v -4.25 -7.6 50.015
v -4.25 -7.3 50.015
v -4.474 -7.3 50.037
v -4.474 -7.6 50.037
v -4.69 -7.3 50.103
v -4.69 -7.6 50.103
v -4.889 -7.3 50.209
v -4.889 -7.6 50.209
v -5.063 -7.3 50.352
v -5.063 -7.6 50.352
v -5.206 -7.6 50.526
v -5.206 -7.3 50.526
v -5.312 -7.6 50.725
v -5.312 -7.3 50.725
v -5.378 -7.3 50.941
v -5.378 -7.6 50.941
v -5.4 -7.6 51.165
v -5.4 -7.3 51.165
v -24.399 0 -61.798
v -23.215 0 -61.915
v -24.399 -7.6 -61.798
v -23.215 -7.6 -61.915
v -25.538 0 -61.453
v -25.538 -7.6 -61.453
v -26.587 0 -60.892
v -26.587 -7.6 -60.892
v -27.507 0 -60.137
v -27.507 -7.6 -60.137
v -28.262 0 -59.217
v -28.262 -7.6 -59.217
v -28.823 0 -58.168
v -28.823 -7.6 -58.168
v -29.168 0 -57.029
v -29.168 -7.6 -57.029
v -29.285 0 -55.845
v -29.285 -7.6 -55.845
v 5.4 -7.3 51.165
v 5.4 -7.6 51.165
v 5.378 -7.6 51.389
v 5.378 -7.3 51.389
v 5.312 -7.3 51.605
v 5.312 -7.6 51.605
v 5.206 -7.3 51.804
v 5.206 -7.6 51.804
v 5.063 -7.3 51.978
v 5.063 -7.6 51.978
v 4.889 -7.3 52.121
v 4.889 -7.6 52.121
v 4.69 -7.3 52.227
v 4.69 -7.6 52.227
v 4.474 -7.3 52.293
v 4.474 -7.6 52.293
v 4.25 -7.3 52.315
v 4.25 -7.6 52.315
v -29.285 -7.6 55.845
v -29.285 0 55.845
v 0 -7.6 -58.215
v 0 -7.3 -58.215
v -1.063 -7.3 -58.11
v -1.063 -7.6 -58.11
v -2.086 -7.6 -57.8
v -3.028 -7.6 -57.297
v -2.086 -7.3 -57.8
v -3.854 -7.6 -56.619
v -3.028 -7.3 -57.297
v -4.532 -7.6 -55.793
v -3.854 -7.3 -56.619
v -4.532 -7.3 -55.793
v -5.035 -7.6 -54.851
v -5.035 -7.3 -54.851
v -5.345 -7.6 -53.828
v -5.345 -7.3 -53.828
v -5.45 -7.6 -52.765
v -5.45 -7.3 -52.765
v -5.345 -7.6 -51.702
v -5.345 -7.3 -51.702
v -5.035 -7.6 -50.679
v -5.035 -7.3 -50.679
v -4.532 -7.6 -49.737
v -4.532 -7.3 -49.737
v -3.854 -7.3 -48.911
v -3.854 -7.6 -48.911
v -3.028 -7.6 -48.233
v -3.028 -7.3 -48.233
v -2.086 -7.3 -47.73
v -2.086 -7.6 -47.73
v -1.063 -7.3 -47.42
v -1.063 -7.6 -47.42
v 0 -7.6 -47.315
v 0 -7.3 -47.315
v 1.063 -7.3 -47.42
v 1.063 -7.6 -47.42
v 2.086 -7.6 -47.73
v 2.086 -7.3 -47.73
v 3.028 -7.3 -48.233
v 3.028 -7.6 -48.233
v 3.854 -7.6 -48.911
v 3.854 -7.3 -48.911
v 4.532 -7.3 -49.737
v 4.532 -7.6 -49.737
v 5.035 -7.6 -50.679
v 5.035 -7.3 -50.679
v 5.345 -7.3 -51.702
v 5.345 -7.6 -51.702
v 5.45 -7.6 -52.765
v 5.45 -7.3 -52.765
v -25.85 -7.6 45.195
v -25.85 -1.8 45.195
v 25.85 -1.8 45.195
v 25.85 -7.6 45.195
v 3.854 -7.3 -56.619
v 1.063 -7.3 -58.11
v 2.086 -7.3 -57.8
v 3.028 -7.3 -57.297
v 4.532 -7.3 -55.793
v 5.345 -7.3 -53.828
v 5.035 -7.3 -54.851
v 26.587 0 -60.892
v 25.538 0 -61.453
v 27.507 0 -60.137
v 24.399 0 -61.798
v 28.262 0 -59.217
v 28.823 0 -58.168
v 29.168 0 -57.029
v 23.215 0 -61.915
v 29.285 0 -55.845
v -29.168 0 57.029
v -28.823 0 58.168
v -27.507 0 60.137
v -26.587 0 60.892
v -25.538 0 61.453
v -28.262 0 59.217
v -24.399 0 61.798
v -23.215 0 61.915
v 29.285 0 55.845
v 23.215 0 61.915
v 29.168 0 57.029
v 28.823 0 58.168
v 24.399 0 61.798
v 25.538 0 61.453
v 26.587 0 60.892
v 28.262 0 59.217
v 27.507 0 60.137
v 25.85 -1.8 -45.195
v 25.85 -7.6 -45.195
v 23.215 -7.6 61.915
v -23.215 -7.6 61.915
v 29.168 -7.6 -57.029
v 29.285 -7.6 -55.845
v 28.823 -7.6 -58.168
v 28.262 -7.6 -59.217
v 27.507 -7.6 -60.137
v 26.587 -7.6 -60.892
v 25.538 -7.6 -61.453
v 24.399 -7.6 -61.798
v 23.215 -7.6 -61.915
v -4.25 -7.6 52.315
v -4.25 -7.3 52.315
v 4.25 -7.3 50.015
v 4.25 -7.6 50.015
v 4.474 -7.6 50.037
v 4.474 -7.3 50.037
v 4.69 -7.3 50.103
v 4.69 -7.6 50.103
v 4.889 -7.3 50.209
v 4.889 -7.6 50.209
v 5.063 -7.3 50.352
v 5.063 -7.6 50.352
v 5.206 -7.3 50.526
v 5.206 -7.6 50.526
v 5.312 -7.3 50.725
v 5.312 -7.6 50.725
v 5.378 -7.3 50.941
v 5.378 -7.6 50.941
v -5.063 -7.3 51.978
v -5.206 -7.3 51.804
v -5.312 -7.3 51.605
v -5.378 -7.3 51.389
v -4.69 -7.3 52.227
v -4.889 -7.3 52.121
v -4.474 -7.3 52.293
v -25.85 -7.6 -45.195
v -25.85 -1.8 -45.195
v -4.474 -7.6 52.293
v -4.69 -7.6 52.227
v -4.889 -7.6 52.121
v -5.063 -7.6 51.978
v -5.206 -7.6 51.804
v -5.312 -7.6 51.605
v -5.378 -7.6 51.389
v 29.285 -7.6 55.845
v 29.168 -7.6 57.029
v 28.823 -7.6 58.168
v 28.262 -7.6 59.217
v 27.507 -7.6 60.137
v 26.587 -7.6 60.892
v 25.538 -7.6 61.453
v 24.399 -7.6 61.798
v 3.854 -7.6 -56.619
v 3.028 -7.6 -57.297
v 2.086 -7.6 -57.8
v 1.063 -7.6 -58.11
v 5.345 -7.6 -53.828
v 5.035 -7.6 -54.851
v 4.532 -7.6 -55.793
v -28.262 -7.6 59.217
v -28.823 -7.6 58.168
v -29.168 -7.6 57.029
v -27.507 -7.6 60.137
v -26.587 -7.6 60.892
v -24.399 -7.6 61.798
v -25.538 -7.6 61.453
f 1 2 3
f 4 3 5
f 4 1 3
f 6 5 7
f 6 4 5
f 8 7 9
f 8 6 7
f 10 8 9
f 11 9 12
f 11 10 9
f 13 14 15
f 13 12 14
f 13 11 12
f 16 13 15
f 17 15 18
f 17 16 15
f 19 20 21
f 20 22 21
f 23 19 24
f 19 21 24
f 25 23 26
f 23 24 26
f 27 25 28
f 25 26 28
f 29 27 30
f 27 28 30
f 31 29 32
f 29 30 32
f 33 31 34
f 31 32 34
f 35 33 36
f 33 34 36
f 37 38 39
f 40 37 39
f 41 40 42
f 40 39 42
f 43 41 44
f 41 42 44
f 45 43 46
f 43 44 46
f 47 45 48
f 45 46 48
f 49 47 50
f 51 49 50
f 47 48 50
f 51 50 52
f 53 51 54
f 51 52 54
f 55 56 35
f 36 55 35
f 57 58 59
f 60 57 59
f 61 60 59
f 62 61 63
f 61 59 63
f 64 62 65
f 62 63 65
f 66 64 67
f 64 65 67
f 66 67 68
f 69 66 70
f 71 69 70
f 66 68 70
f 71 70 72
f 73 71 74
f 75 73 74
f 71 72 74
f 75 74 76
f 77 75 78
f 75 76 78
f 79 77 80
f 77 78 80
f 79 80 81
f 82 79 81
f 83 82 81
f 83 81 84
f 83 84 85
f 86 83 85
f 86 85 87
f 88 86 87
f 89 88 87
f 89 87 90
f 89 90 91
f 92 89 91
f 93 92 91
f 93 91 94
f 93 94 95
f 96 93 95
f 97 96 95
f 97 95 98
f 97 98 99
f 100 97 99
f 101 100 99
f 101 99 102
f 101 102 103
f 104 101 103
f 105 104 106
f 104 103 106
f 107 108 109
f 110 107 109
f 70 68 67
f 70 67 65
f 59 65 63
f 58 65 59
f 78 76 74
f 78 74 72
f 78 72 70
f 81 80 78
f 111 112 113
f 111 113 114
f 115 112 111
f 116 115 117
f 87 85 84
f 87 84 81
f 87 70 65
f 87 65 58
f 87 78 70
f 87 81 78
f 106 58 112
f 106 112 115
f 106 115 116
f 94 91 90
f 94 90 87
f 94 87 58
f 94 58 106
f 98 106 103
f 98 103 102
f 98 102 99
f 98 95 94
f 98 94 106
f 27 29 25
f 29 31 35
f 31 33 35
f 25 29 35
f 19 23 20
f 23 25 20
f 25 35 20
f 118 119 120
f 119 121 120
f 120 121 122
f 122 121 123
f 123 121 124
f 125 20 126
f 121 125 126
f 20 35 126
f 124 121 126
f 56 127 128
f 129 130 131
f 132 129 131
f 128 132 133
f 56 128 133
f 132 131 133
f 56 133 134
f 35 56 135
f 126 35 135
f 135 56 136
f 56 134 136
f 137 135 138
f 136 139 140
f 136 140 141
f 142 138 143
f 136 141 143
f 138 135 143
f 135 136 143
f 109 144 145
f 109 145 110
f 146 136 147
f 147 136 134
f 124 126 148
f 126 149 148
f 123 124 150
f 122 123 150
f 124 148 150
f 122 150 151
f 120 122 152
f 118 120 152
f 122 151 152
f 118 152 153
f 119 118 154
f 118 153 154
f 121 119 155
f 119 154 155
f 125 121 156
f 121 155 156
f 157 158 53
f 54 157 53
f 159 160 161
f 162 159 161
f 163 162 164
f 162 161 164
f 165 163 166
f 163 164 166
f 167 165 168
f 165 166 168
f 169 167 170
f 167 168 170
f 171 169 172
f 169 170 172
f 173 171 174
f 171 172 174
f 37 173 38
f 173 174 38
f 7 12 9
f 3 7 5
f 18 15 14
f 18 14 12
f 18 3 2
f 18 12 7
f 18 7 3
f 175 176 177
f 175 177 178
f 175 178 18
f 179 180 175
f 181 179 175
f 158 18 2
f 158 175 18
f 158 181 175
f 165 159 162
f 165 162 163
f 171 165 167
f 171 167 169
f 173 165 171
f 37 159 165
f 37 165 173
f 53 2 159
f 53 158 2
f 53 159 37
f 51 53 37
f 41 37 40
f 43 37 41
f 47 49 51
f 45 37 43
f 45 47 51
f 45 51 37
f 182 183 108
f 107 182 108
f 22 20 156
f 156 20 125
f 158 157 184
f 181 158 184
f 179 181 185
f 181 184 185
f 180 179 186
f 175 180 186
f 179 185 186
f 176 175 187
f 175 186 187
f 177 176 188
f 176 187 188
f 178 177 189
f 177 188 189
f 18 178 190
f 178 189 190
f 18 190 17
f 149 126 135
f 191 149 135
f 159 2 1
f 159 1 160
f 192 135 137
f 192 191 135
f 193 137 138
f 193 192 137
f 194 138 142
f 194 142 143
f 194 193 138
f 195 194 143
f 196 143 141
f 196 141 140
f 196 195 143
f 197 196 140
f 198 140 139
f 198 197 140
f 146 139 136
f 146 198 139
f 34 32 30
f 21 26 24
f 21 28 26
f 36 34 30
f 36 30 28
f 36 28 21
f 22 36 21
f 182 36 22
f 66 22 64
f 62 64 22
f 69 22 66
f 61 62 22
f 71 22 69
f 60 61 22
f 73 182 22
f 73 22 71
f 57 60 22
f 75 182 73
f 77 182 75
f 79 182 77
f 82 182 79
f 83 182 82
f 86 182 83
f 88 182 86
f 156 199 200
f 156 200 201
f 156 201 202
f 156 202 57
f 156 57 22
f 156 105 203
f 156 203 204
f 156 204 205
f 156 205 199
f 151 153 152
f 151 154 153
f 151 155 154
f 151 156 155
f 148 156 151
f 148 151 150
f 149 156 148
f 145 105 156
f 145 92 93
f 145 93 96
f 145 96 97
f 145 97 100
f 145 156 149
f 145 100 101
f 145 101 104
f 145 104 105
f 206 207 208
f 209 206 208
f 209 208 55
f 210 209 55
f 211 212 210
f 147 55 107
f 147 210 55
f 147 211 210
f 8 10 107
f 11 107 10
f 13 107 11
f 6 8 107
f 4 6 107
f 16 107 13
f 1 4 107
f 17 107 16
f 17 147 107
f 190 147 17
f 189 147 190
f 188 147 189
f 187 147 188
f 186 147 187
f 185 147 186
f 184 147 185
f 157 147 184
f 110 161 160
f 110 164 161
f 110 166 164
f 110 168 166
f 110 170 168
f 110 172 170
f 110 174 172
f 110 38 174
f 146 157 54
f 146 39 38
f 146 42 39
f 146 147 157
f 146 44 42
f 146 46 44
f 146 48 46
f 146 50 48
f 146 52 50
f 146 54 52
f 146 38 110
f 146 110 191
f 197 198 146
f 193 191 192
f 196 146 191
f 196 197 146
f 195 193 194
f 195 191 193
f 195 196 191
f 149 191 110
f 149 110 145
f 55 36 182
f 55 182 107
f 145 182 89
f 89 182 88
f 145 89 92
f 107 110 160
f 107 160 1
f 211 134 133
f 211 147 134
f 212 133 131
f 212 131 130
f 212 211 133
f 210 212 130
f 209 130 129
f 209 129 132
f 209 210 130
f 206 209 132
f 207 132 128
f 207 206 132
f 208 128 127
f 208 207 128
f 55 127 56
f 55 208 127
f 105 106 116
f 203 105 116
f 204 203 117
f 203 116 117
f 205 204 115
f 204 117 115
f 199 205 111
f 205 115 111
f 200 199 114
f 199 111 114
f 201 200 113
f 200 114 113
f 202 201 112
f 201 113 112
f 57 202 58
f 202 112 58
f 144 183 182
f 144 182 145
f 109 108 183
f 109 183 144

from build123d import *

# Parameters (mm, degrees)
F0_W     = 51.7
F0_H     = 90.39
F0_W_2   = 10.8
F0_H_2   = 2.3
F1_DEPTH = 7.6
F2_R     = 6.07
F3_DEPTH = 1.8
F4_R     = 1.14999
F5_DEPTH = 7.3
F6_DEPTH = 7.3


# Not quite as in the source:
# - a fillet or chamfer is up to 0.001 mm smaller than in the source, because OpenCascade refuses the exact size


with BuildPart() as f1:
    # F0 (on Front) → F1 (new body)
    with BuildSketch(Plane.XZ):
        Polygon((0, -61.915), (29.285, -61.915), (29.285, 61.915), (-29.285, 61.915), (-29.285, -61.915), align=None)
        with BuildLine():
            ThreePointArc((5.45, -52.765), (3.8537319575, -56.6187319575), (0, -58.215))
            ThreePointArc((0, -58.215), (-3.8537319575, -48.9112680425), (5.45, -52.765))
        make_face(mode=Mode.SUBTRACT)
        Rectangle(F0_W, F0_H, mode=Mode.SUBTRACT)
        with Locations((0, 51.165)):
            Rectangle(F0_W_2, F0_H_2, mode=Mode.SUBTRACT)
    extrude(amount=F1_DEPTH)

    # F2
    f2_edges = [f1.edges().sort_by_distance(p)[0] for p in [
        (-29.285, -3.8, 61.915),
        (29.285, -3.8, 61.915),
        (-29.285, -3.8, -61.915),
        (29.285, -3.8, -61.915),
    ]]
    fillet(f2_edges, radius=F2_R)

    # F0 (on Front) → F3 (join)
    with BuildSketch(Plane.XZ):
        Rectangle(F0_W, F0_H)
    extrude(amount=F3_DEPTH)

    # F4 (radius 1.15 in the source; OpenCascade refuses exactly that, so slightly less here)
    f4_edges = [f1.edges().sort_by_distance(p)[0] for p in [
        (-5.4, -3.8, 52.315),
        (5.4, -3.8, 52.315),
        (5.4, -3.8, 50.015),
        (-5.4, -3.8, 50.015),
    ]]
    fillet(f4_edges, radius=F4_R)

    # F0 (on Front) → F5 (join)
    with BuildSketch(Plane.XZ):
        with Locations((0, 51.165)):
            Rectangle(F0_W_2, F0_H_2)
    extrude(amount=F5_DEPTH)

    # F0 (on Front) → F6 (join)
    with BuildSketch(Plane.XZ):
        with BuildLine():
            ThreePointArc((5.45, -52.765), (-3.8537319575, -48.9112680425), (0, -58.215))
            ThreePointArc((0, -58.215), (3.8537319575, -56.6187319575), (5.45, -52.765))
        make_face()
    extrude(amount=F6_DEPTH)


solid = f1.part
